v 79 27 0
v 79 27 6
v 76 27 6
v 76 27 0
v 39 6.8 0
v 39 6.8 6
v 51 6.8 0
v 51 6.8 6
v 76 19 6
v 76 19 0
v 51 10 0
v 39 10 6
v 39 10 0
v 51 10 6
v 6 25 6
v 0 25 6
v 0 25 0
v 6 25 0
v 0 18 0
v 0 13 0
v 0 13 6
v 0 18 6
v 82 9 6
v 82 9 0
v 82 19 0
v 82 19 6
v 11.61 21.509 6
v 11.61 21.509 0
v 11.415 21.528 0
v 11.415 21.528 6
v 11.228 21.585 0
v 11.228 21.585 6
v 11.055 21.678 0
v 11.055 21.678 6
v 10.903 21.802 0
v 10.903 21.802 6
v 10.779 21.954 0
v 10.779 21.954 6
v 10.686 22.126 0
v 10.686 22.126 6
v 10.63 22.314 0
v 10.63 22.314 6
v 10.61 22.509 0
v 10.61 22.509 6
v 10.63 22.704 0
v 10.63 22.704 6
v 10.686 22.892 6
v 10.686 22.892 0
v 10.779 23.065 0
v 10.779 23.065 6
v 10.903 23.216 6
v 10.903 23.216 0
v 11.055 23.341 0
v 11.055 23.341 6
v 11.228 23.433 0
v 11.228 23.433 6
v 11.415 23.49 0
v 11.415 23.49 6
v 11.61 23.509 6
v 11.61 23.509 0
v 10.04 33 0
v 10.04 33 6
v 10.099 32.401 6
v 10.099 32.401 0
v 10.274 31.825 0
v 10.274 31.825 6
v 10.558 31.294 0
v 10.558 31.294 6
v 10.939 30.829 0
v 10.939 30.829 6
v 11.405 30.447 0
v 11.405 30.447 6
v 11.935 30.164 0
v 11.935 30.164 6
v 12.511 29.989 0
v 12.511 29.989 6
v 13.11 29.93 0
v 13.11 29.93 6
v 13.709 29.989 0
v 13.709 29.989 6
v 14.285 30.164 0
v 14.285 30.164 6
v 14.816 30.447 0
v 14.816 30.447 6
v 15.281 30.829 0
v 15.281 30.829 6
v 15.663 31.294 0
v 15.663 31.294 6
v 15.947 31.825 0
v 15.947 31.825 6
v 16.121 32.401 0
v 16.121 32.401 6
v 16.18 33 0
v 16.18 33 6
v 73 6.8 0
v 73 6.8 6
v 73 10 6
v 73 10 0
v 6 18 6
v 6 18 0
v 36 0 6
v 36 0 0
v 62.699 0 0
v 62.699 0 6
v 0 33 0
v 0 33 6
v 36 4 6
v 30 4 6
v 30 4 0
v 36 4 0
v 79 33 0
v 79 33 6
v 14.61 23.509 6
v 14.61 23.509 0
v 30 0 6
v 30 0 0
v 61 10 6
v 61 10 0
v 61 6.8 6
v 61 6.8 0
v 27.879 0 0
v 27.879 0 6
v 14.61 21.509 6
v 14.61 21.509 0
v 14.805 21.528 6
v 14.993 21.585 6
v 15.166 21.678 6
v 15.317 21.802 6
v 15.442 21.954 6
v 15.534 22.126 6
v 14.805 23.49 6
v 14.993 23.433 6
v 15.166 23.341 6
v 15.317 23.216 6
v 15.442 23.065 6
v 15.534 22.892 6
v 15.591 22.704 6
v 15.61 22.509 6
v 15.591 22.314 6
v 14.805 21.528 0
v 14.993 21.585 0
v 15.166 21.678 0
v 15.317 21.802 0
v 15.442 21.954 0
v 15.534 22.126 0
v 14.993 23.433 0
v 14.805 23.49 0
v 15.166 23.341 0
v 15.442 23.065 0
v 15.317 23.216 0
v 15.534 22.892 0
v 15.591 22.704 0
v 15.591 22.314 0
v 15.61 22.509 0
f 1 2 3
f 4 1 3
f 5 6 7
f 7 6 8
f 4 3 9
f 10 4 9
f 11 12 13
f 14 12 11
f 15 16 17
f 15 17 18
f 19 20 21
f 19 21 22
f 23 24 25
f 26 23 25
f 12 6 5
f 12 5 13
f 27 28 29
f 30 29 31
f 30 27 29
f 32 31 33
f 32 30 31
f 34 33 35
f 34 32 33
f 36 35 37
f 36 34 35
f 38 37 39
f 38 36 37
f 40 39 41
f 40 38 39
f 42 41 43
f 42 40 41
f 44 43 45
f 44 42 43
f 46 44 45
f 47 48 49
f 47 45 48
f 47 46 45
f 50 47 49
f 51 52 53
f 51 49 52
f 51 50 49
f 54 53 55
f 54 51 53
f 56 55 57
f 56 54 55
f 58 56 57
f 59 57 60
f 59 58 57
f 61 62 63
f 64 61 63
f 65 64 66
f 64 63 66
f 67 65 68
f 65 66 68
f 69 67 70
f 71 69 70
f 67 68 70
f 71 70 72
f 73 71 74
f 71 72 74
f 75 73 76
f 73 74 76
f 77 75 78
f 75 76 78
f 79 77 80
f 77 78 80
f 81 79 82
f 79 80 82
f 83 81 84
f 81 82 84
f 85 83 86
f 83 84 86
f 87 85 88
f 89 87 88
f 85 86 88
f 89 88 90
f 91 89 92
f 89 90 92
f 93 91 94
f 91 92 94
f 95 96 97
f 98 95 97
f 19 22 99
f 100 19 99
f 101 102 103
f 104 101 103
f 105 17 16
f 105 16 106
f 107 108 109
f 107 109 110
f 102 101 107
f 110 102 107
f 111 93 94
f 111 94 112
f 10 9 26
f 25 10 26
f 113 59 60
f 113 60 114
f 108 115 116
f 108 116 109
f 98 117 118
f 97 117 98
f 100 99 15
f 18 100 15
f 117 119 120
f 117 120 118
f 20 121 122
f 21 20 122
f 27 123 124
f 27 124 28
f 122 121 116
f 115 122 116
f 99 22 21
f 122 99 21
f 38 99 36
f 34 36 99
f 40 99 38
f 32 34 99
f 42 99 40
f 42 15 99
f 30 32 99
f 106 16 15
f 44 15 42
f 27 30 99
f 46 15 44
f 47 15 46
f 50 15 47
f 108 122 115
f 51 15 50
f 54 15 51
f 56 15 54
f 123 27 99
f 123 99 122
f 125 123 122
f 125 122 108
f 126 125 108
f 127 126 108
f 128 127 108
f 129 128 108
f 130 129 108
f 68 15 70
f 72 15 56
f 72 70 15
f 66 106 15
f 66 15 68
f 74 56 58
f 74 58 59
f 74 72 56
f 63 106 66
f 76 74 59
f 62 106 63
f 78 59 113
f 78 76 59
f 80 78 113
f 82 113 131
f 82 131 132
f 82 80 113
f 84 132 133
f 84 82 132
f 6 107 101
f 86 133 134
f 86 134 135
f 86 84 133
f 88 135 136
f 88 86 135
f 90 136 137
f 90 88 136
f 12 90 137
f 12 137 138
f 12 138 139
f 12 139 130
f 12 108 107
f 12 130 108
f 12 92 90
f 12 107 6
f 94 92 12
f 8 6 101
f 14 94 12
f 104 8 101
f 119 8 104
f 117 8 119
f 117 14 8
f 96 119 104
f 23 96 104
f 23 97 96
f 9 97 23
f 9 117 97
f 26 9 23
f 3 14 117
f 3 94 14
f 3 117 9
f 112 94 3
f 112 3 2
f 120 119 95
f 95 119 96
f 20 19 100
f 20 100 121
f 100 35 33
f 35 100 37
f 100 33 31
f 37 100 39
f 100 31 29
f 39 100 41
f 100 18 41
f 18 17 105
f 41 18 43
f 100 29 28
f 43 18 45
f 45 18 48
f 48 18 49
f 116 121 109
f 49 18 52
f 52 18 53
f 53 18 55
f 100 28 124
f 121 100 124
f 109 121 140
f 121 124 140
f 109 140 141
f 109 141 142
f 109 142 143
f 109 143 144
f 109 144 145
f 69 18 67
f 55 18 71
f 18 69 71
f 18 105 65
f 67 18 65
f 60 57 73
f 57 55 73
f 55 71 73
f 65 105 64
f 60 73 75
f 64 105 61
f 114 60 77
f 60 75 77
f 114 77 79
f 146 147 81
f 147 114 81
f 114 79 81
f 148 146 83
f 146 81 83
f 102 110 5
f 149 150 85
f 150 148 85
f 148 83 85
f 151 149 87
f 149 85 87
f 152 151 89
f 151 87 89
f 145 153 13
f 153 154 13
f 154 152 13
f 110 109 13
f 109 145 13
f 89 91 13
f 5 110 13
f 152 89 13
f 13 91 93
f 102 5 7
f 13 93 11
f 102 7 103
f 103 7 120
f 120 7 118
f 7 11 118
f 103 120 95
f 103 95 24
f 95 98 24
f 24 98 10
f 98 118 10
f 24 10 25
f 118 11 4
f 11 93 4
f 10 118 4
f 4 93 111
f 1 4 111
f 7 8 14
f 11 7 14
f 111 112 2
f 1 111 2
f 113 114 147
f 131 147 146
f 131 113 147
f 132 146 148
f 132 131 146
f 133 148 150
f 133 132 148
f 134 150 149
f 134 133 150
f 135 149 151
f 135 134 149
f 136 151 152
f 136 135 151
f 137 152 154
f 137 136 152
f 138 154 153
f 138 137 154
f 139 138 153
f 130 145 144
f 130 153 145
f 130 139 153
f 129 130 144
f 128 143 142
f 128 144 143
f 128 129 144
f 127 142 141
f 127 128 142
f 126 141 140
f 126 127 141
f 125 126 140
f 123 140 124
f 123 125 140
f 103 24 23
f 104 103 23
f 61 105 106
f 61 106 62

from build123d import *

# Parameters (mm, degrees)
ESQUISSE1_W             = 82
ESQUISSE1_H             = 33
BOSS_EXTRU_1_DEPTH      = 6
ENL_V_MAT_EXTRU_1_DEPTH = 10
ESQUISSE3_W             = 6
ESQUISSE3_H             = 7
ENL_V_MAT_EXTRU_2_DEPTH = 89.594582227
CHANFREIN1_SIZE         = 13
CHANFREIN1_SIZE2        = 27.878589967
CHANFREIN2_SIZE         = 9
CHANFREIN2_SIZE2        = 19.300562285
ESQUISSE4_W             = 12
ESQUISSE4_H             = 3.2
ENL_V_MAT_EXTRU_3_DEPTH = 10
ESQUISSE5_R             = 3.070048726
ENL_V_MAT_EXTRU_4_DEPTH = 10
ESQUISSE6_W             = 6
ESQUISSE6_H             = 9
ENL_V_MAT_EXTRU_5_DEPTH = 89.594582227


with BuildPart() as part:
    # Esquisse1 → Boss.-Extru.1 (new body)
    with BuildSketch(Plane.XY):
        with Locations((41, 16.5)):
            Rectangle(ESQUISSE1_W, ESQUISSE1_H)
    extrude(amount=BOSS_EXTRU_1_DEPTH)

    # Esquisse2 → Enlèv. mat.-Extru.1 (cut)
    with BuildSketch(Plane.XY.offset(6)):
        Polygon((82, 33), (79, 33), (79, 27), (76, 27), (76, 19), (82, 19), align=None)
    extrude(amount=-ENL_V_MAT_EXTRU_1_DEPTH, mode=Mode.SUBTRACT)

    # Esquisse3 → Enlèv. mat.-Extru.2 (cut, through all)
    with BuildSketch(Plane.XY.offset(6)):
        with Locations((3, 21.5)):
            Rectangle(ESQUISSE3_W, ESQUISSE3_H)
    extrude(amount=-ENL_V_MAT_EXTRU_2_DEPTH, mode=Mode.SUBTRACT)

    # Chanfrein1
    chanfrein1_edges = [part.edges().sort_by_distance(p)[0] for p in [
        (0, 0, 3),
    ]]
    chanfrein1_side = [part.faces().sort_by_distance(p)[0] for p in [
        (0, 9, 3),
    ]]
    chamfer(chanfrein1_edges, length=CHANFREIN1_SIZE, length2=CHANFREIN1_SIZE2, reference=chanfrein1_side[0])

    # Chanfrein2
    chanfrein2_edges = [part.edges().sort_by_distance(p)[0] for p in [
        (82, 0, 3),
    ]]
    chanfrein2_side = [part.faces().sort_by_distance(p)[0] for p in [
        (82, 9.5, 3),
    ]]
    chamfer(chanfrein2_edges, length=CHANFREIN2_SIZE, length2=CHANFREIN2_SIZE2, reference=chanfrein2_side[0])

    # Esquisse4 → Enlèv. mat.-Extru.3 (cut)
    with BuildSketch(Plane.XY.offset(6)):
        with Locations((45, 8.4)):
            Rectangle(ESQUISSE4_W, ESQUISSE4_H)
        with Locations((67, 8.4)):
            Rectangle(ESQUISSE4_W, ESQUISSE4_H)
    extrude(amount=-ENL_V_MAT_EXTRU_3_DEPTH, mode=Mode.SUBTRACT)

    # Esquisse5 → Enlèv. mat.-Extru.4 (cut)
    with BuildSketch(Plane.XY.offset(6)):
        with Locations((13.110300044, 33)):
            Circle(ESQUISSE5_R)
        with BuildLine():
            Line((448.809841118, 61.994892284), (448.809841118, 59.994892284))
            ThreePointArc((448.809841118, 59.994892284), (447.809841118, 58.994892284), (446.809841118, 59.994892284))
            Line((446.809841118, 59.994892284), (446.809841118, 61.994892284))
            ThreePointArc((446.809841118, 61.994892284), (447.809841118, 62.994892284), (448.809841118, 61.994892284))
        make_face()
        with BuildLine():
            Line((442.809841118, 61.994892284), (442.809841118, 59.994892284))
            ThreePointArc((442.809841118, 59.994892284), (441.809841118, 58.994892284), (440.809841118, 59.994892284))
            Line((440.809841118, 59.994892284), (440.809841118, 61.994892284))
            ThreePointArc((440.809841118, 61.994892284), (441.809841118, 62.994892284), (442.809841118, 61.994892284))
        make_face()
        with BuildLine():
            Line((442.809841118, 86.994892284), (442.809841118, 84.994892284))
            ThreePointArc((442.809841118, 84.994892284), (441.809841118, 83.994892284), (440.809841118, 84.994892284))
            Line((440.809841118, 84.994892284), (440.809841118, 86.994892284))
            ThreePointArc((440.809841118, 86.994892284), (441.809841118, 87.994892284), (442.809841118, 86.994892284))
        make_face()
        with BuildLine():
            Line((442.809841118, 111.994892284), (442.809841118, 109.994892284))
            ThreePointArc((442.809841118, 109.994892284), (441.809841118, 108.994892284), (440.809841118, 109.994892284))
            Line((440.809841118, 109.994892284), (440.809841118, 111.994892284))
            ThreePointArc((440.809841118, 111.994892284), (441.809841118, 112.994892284), (442.809841118, 111.994892284))
        make_face()
        with BuildLine():
            Line((442.809841118, 136.994892284), (442.809841118, 134.994892284))
            ThreePointArc((442.809841118, 134.994892284), (441.809841118, 133.994892284), (440.809841118, 134.994892284))
            Line((440.809841118, 134.994892284), (440.809841118, 136.994892284))
            ThreePointArc((440.809841118, 136.994892284), (441.809841118, 137.994892284), (442.809841118, 136.994892284))
        make_face()
        with BuildLine():
            Line((448.809841118, 86.994892284), (448.809841118, 84.994892284))
            ThreePointArc((448.809841118, 84.994892284), (447.809841118, 83.994892284), (446.809841118, 84.994892284))
            Line((446.809841118, 84.994892284), (446.809841118, 86.994892284))
            ThreePointArc((446.809841118, 86.994892284), (447.809841118, 87.994892284), (448.809841118, 86.994892284))
        make_face()
        with BuildLine():
            Line((448.809841118, 111.994892284), (448.809841118, 109.994892284))
            ThreePointArc((448.809841118, 109.994892284), (447.809841118, 108.994892284), (446.809841118, 109.994892284))
            Line((446.809841118, 109.994892284), (446.809841118, 111.994892284))
            ThreePointArc((446.809841118, 111.994892284), (447.809841118, 112.994892284), (448.809841118, 111.994892284))
        make_face()
        with BuildLine():
            Line((448.809841118, 136.994892284), (448.809841118, 134.994892284))
            ThreePointArc((448.809841118, 134.994892284), (447.809841118, 133.994892284), (446.809841118, 134.994892284))
            Line((446.809841118, 134.994892284), (446.809841118, 136.994892284))
            ThreePointArc((446.809841118, 136.994892284), (447.809841118, 137.994892284), (448.809841118, 136.994892284))
        make_face()
        with BuildLine():
            Line((11.610300044, 23.509087354), (14.610300044, 23.509087354))
            ThreePointArc((14.610300044, 23.509087354), (15.610300044, 22.509087354), (14.610300044, 21.509087354))
            Line((14.610300044, 21.509087354), (11.610300044, 21.509087354))
            ThreePointArc((11.610300044, 21.509087354), (10.610300044, 22.509087354), (11.610300044, 23.509087354))
        make_face()
    extrude(amount=-ENL_V_MAT_EXTRU_4_DEPTH, mode=Mode.SUBTRACT)

    # Esquisse6 → Enlèv. mat.-Extru.5 (cut, through all)
    with BuildSketch(Plane.XY.offset(6)):
        with Locations((33, -0.5)):
            Rectangle(ESQUISSE6_W, ESQUISSE6_H)
    extrude(amount=-ENL_V_MAT_EXTRU_5_DEPTH, mode=Mode.SUBTRACT)


solid = part.part
